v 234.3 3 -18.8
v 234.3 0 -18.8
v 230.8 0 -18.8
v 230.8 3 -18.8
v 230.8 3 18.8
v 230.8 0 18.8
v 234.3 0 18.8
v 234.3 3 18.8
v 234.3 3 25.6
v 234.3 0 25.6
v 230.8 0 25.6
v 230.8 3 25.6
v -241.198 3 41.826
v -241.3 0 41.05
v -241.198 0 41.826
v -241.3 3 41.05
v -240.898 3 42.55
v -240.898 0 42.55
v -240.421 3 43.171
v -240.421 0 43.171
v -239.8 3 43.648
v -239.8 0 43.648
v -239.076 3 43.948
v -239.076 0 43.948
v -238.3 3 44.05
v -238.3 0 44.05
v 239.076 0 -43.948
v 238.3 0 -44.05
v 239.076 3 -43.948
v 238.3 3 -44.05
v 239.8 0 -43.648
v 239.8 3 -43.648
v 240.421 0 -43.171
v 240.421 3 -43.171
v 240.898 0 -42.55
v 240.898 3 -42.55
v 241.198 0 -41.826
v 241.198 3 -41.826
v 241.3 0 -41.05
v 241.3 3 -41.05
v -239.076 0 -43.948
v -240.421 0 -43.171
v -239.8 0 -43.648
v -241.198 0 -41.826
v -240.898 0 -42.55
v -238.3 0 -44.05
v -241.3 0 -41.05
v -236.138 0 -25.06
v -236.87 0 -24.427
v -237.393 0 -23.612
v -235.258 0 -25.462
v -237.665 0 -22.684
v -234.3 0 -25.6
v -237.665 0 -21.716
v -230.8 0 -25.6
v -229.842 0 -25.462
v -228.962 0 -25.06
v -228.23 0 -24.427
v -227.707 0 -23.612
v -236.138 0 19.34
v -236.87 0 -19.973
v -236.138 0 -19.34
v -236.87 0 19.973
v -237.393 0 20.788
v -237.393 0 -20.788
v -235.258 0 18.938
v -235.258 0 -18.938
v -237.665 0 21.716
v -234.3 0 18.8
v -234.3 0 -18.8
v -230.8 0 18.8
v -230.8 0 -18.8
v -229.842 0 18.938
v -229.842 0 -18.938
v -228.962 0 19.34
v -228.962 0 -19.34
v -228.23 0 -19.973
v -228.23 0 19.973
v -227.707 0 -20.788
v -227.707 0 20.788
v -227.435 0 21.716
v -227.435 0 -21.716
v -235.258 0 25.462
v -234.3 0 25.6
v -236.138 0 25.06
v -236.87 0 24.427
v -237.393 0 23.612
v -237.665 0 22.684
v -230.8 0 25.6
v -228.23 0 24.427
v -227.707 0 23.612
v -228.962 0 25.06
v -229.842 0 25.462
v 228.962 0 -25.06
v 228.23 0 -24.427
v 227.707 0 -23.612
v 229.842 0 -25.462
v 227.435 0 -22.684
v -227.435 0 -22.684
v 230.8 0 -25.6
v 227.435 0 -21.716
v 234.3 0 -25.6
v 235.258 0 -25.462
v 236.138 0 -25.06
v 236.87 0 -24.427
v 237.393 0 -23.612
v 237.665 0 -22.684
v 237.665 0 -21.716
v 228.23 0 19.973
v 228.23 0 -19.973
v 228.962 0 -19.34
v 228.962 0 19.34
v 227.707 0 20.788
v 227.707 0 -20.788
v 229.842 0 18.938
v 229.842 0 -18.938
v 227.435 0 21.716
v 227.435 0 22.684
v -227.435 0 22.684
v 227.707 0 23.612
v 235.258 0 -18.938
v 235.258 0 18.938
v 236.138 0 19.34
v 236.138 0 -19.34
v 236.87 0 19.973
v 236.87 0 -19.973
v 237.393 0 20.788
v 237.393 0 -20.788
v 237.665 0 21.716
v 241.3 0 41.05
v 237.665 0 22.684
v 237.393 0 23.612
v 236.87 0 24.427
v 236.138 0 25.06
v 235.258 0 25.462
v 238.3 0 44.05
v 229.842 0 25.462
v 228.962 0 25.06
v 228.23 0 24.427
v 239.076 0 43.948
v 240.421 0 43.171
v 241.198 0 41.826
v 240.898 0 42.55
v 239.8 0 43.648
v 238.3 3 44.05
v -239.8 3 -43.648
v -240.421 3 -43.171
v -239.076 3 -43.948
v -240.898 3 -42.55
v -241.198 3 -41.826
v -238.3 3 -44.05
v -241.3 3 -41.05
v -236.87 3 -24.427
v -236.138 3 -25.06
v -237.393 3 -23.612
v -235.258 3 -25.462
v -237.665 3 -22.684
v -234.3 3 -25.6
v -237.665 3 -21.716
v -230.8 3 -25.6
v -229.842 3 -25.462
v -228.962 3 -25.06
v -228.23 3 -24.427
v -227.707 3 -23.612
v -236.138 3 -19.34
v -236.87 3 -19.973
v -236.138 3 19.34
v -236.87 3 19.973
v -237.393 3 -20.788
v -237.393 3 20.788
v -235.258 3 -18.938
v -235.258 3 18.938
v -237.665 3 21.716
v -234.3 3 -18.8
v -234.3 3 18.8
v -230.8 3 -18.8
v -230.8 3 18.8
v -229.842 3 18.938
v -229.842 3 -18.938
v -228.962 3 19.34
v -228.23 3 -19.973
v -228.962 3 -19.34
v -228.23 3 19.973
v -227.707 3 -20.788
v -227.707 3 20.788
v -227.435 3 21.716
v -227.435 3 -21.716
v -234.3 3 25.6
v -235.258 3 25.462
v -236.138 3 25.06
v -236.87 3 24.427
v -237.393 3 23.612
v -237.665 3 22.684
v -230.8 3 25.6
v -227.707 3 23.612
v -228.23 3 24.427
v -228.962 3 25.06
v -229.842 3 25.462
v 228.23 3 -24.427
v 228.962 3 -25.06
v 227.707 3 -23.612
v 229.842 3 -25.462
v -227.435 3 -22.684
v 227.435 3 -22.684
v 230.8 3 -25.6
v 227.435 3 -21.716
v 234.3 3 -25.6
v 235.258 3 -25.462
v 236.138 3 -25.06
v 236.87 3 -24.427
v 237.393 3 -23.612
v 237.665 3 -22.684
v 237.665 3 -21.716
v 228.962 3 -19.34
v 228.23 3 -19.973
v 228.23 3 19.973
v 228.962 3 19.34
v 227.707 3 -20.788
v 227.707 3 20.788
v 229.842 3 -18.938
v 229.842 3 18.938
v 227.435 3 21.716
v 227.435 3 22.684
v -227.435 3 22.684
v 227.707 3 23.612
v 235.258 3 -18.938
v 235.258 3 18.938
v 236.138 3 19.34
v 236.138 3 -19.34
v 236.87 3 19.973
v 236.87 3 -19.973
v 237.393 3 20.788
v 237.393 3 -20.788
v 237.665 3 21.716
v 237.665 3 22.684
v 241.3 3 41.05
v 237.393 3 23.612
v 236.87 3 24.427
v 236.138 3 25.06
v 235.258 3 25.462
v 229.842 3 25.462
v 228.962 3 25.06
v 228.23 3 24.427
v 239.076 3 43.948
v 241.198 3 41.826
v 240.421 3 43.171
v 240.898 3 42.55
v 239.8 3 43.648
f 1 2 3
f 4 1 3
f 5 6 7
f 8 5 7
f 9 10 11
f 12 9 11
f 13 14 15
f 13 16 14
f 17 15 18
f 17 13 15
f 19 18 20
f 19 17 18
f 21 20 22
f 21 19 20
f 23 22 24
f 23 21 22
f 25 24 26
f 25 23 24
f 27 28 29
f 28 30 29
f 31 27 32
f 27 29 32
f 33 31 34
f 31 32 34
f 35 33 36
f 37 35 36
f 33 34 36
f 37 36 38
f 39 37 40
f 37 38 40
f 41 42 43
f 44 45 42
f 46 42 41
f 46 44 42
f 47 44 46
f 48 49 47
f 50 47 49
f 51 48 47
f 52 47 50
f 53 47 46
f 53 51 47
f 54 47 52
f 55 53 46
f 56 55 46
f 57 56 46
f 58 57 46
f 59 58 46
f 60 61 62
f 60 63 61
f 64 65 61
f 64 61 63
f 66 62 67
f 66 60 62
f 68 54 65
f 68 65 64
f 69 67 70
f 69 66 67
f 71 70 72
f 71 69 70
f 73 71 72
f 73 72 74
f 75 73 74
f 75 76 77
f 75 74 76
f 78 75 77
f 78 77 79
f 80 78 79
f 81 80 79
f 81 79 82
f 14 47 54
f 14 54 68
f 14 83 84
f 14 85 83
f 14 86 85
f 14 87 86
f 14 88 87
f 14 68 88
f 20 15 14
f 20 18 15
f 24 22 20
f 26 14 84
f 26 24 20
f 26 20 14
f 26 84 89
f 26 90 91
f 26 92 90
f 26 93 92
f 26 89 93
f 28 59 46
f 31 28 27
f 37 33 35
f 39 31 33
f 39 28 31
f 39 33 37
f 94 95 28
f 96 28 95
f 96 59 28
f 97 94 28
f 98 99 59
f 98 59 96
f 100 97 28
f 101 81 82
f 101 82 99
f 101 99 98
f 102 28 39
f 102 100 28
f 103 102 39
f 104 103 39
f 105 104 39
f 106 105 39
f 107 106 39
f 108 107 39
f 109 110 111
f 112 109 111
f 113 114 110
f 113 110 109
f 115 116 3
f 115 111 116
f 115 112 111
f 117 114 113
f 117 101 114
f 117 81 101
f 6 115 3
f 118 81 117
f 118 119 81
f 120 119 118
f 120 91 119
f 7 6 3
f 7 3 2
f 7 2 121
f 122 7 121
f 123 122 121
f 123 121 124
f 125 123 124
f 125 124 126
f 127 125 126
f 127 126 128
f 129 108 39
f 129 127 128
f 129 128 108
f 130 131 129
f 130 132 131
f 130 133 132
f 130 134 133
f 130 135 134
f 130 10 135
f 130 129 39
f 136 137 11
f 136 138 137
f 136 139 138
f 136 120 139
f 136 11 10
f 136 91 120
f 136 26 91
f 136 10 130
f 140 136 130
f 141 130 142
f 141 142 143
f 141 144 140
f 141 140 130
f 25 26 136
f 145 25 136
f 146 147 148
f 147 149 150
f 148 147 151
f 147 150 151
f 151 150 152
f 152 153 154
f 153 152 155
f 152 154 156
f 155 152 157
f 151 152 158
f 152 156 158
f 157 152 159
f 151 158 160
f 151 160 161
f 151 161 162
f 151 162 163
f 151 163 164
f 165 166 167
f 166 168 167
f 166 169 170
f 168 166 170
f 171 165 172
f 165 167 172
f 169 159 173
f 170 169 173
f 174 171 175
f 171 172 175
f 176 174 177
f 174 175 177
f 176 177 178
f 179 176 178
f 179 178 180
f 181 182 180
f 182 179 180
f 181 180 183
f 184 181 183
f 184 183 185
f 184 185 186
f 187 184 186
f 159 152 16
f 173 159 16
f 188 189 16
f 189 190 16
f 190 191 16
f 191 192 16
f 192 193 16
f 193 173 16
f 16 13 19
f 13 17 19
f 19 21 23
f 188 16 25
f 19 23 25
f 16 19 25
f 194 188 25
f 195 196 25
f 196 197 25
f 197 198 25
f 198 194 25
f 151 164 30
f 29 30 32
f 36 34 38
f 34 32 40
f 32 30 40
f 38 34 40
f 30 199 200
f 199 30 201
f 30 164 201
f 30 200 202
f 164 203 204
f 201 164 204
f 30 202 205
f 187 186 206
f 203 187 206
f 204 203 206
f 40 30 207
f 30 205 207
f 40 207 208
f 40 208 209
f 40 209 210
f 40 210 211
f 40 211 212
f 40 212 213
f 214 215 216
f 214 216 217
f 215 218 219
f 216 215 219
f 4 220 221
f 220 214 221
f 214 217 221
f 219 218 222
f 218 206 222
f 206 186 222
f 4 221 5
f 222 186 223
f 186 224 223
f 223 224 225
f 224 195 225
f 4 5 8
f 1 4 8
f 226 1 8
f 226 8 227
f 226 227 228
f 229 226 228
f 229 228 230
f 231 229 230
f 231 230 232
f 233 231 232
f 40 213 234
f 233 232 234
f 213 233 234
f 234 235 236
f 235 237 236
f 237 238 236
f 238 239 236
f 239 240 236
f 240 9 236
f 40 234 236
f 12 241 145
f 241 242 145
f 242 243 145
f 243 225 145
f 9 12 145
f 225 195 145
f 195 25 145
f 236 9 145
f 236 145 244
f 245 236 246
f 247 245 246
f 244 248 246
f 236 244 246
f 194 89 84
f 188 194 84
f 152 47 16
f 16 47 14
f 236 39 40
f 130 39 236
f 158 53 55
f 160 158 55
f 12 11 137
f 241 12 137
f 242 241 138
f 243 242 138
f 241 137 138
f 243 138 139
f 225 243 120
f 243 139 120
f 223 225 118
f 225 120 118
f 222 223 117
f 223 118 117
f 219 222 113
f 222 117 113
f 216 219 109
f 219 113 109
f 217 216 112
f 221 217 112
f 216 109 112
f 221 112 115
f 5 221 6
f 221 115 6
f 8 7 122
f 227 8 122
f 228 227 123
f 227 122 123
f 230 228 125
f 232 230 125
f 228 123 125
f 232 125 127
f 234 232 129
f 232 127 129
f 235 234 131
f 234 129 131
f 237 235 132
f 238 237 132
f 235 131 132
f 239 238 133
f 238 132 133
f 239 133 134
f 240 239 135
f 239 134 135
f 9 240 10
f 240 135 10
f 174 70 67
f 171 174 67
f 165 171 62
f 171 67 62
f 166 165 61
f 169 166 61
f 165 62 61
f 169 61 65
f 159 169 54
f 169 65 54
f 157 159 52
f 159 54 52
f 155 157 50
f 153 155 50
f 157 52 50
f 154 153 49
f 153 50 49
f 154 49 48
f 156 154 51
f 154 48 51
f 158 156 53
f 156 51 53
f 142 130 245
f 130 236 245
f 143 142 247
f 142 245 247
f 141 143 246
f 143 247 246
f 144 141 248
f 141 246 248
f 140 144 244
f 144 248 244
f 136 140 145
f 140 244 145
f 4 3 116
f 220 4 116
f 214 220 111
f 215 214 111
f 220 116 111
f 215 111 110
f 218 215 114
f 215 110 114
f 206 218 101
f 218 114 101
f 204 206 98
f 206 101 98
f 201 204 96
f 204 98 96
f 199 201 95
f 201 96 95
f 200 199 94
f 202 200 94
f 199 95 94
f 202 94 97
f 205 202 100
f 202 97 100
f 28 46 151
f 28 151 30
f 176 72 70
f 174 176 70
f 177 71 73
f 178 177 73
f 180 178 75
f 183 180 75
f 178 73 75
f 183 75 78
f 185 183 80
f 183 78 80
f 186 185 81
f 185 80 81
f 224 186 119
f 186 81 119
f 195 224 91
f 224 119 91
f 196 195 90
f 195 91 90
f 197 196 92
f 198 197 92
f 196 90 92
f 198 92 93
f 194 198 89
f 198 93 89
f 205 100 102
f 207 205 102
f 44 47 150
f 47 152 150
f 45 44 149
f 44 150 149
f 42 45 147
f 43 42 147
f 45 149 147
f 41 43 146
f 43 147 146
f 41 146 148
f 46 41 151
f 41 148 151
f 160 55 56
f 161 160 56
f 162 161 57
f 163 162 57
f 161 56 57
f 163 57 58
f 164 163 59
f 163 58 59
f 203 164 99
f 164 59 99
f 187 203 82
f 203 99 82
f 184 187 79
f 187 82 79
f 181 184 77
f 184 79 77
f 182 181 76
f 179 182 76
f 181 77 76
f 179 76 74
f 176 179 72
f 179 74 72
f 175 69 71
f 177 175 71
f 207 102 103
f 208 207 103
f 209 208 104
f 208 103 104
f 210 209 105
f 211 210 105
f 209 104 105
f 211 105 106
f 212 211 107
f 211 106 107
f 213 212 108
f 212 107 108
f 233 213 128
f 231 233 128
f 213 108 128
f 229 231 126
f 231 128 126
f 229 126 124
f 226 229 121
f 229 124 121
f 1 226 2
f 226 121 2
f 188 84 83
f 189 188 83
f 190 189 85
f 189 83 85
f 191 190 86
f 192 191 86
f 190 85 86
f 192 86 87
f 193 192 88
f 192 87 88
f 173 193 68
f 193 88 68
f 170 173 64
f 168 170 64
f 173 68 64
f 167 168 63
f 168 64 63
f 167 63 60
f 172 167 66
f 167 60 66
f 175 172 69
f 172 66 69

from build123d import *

# Parameters (mm, degrees)
F0_W     = 482.6
F0_H     = 88.1
F1_DEPTH = 3
F2_R     = 3
F4_DEPTH = 3


with BuildPart() as f1:
    # F0 (on Front) → F1 (new body)
    with BuildSketch(Plane.XZ):
        Rectangle(F0_W, F0_H)
    extrude(amount=-F1_DEPTH)

    # F2
    f2_edges = [f1.edges().sort_by_distance(p)[0] for p in [
        (-241.3, 1.5, 44.05),
        (241.3, 1.5, 44.05),
        (241.3, 1.5, -44.05),
        (-241.3, 1.5, -44.05),
    ]]
    fillet(f2_edges, radius=F2_R)

    # F3 (on Front) → F4 (cut, through all)
    with BuildSketch(Plane.XZ):
        with BuildLine():
            Line((-234.3, 18.8), (-230.8, 18.8))
            ThreePointArc((-230.8, 18.8), (-227.4, 22.2), (-230.8, 25.6))
            Line((-230.8, 25.6), (-234.3, 25.6))
            ThreePointArc((-234.3, 25.6), (-237.7, 22.2), (-234.3, 18.8))
        make_face()
        with BuildLine():
            ThreePointArc((230.8, 25.6), (227.4, 22.2), (230.8, 18.8))
            Line((230.8, 18.8), (234.3, 18.8))
            ThreePointArc((234.3, 18.8), (237.7, 22.2), (234.3, 25.6))
            Line((234.3, 25.6), (230.8, 25.6))
        make_face()
        with BuildLine():
            Line((230.8, -25.6), (234.3, -25.6))
            ThreePointArc((234.3, -25.6), (237.7, -22.2), (234.3, -18.8))
            Line((234.3, -18.8), (230.8, -18.8))
            ThreePointArc((230.8, -18.8), (227.4, -22.2), (230.8, -25.6))
        make_face()
        with BuildLine():
            ThreePointArc((-230.8, -25.6), (-227.4, -22.2), (-230.8, -18.8))
            Line((-230.8, -18.8), (-234.3, -18.8))
            ThreePointArc((-234.3, -18.8), (-237.7, -22.2), (-234.3, -25.6))
            Line((-234.3, -25.6), (-230.8, -25.6))
        make_face()
    extrude(amount=-F4_DEPTH, mode=Mode.SUBTRACT)


solid = f1.part
